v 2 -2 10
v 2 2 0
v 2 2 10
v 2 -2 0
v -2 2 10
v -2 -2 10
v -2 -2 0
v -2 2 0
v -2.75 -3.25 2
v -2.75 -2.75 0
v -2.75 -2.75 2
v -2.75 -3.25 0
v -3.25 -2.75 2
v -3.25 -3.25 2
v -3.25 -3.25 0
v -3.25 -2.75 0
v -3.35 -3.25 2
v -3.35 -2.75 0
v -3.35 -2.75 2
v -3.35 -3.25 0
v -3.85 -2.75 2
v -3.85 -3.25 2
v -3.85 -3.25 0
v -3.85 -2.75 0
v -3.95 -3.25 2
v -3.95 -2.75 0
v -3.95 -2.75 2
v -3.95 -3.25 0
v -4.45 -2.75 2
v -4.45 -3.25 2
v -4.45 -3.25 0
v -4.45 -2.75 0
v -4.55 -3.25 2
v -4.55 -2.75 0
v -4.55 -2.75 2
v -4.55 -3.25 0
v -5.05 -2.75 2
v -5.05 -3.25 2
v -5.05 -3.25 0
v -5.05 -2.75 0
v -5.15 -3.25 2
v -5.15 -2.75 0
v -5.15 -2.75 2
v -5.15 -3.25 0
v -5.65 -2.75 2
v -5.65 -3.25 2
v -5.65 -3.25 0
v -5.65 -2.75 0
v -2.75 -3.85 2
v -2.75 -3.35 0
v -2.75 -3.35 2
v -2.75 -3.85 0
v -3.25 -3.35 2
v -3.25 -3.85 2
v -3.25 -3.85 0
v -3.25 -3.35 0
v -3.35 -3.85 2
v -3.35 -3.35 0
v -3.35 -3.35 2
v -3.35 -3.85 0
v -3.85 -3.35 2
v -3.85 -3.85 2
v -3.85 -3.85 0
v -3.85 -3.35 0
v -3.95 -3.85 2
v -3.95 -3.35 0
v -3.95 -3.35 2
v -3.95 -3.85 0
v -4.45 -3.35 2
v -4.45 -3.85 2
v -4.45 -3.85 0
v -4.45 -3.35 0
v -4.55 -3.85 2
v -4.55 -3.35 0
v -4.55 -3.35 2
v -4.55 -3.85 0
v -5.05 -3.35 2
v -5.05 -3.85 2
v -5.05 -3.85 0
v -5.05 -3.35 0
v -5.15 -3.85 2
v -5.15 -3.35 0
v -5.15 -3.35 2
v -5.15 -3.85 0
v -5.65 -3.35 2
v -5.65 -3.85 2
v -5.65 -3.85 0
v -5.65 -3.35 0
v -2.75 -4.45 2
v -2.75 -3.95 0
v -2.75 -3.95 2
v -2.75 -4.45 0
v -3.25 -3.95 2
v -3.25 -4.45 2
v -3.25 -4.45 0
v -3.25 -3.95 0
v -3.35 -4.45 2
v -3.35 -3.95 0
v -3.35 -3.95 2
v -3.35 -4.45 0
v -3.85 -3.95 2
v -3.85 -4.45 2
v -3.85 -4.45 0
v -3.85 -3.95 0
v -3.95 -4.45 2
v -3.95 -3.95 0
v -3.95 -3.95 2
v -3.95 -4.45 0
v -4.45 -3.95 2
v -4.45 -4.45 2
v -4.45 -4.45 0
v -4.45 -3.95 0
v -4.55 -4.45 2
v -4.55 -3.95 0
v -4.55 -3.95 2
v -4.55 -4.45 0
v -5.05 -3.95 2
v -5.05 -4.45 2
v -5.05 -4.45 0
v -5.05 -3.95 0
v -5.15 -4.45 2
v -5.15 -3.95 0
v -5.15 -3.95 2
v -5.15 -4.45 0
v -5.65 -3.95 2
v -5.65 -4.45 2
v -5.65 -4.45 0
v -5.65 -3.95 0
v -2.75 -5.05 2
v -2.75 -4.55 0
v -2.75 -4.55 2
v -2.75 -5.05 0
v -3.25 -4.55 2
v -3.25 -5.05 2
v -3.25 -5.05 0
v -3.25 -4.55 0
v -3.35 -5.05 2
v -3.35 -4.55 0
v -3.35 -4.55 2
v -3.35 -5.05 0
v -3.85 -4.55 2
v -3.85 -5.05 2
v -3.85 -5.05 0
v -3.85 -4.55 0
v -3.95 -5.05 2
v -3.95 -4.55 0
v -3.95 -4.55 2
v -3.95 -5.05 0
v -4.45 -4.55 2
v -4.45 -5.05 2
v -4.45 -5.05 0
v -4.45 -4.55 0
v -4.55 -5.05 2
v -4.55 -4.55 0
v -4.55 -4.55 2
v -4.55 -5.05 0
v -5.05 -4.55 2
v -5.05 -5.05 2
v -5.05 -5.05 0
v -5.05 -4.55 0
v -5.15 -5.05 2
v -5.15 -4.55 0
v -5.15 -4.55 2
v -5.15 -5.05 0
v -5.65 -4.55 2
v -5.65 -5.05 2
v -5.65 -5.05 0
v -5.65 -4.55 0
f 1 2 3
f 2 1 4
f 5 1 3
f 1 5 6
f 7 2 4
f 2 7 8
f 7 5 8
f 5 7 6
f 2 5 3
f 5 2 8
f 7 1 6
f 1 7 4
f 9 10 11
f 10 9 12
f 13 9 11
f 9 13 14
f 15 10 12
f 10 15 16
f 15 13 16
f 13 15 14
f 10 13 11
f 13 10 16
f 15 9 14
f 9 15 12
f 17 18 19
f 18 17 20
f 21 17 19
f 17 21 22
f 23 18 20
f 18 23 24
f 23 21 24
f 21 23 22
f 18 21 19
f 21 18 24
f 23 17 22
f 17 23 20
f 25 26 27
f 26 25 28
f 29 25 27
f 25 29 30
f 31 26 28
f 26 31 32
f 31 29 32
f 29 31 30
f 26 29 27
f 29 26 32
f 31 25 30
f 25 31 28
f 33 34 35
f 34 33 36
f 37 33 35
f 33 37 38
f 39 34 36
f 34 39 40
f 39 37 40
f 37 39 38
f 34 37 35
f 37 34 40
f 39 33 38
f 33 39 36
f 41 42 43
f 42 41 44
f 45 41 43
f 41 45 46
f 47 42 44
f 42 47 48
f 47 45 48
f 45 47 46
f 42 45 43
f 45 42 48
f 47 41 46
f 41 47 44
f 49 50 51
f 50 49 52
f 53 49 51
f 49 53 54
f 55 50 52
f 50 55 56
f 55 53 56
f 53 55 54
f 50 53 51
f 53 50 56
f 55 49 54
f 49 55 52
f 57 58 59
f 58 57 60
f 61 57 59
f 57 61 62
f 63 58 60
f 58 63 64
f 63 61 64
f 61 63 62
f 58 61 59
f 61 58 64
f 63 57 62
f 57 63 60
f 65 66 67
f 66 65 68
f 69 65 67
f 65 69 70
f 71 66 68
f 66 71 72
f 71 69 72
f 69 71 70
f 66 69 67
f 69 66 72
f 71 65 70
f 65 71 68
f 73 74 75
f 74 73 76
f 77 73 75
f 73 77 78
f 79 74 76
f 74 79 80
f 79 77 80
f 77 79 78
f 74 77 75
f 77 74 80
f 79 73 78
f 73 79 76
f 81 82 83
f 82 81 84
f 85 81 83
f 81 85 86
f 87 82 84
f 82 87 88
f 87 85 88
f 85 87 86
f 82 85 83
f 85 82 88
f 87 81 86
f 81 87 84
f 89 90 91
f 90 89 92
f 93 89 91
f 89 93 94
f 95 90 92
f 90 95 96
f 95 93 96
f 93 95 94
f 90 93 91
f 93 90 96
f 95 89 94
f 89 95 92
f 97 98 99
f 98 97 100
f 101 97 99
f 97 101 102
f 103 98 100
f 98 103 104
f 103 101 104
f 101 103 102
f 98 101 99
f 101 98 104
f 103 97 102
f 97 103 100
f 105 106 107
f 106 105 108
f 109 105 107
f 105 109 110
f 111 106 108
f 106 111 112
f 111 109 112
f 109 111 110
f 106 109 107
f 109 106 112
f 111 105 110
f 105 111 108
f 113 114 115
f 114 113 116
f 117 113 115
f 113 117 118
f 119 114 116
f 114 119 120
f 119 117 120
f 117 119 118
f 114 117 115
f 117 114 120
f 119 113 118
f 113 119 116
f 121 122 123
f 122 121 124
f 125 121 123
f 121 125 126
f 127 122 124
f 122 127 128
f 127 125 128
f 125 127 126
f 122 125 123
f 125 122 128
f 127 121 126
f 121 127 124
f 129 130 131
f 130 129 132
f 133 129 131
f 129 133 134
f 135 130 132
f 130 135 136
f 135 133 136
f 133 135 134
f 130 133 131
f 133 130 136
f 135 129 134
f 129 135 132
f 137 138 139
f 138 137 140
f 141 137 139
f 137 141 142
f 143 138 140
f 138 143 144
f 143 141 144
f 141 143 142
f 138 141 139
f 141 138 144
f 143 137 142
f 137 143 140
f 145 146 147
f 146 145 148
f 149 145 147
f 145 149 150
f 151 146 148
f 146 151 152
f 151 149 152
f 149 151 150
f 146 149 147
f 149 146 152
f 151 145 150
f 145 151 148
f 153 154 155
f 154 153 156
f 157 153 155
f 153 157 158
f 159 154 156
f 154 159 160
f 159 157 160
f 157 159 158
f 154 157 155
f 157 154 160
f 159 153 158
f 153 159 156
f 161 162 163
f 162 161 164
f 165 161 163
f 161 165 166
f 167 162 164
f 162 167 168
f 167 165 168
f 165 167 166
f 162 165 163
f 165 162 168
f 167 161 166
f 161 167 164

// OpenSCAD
translate([0, 0, 5]) color([0,1,0,0.9]) cube([4, 4, 10], center=true);
translate([-3.0, -3.0, 1]) color([1,0,0]) cube([0.5, 0.5, 2], center=true);
translate([-3.6, -3.0, 1]) color([1,0,0]) cube([0.5, 0.5, 2], center=true);
translate([-4.2, -3.0, 1]) color([1,0,0]) cube([0.5, 0.5, 2], center=true);
translate([-4.8, -3.0, 1]) color([1,0,0]) cube([0.5, 0.5, 2], center=true);
translate([-5.4, -3.0, 1]) color([1,0,0]) cube([0.5, 0.5, 2], center=true);
translate([-3.0, -3.6, 1]) color([1,0,0]) cube([0.5, 0.5, 2], center=true);
translate([-3.6, -3.6, 1]) color([1,0,0]) cube([0.5, 0.5, 2], center=true);
translate([-4.2, -3.6, 1]) color([1,0,0]) cube([0.5, 0.5, 2], center=true);
translate([-4.8, -3.6, 1]) color([1,0,0]) cube([0.5, 0.5, 2], center=true);
translate([-5.4, -3.6, 1]) color([1,0,0]) cube([0.5, 0.5, 2], center=true);
translate([-3.0, -4.2, 1]) color([1,0,0]) cube([0.5, 0.5, 2], center=true);
translate([-3.6, -4.2, 1]) color([1,0,0]) cube([0.5, 0.5, 2], center=true);
translate([-4.2, -4.2, 1]) color([1,0,0]) cube([0.5, 0.5, 2], center=true);
translate([-4.8, -4.2, 1]) color([1,0,0]) cube([0.5, 0.5, 2], center=true);
translate([-5.4, -4.2, 1]) color([1,0,0]) cube([0.5, 0.5, 2], center=true);
translate([-3.0, -4.8, 1]) color([1,0,0]) cube([0.5, 0.5, 2], center=true);
translate([-3.6, -4.8, 1]) color([1,0,0]) cube([0.5, 0.5, 2], center=true);
translate([-4.2, -4.8, 1]) color([1,0,0]) cube([0.5, 0.5, 2], center=true);
translate([-4.8, -4.8, 1]) color([1,0,0]) cube([0.5, 0.5, 2], center=true);
translate([-5.4, -4.8, 1]) color([1,0,0]) cube([0.5, 0.5, 2], center=true);
